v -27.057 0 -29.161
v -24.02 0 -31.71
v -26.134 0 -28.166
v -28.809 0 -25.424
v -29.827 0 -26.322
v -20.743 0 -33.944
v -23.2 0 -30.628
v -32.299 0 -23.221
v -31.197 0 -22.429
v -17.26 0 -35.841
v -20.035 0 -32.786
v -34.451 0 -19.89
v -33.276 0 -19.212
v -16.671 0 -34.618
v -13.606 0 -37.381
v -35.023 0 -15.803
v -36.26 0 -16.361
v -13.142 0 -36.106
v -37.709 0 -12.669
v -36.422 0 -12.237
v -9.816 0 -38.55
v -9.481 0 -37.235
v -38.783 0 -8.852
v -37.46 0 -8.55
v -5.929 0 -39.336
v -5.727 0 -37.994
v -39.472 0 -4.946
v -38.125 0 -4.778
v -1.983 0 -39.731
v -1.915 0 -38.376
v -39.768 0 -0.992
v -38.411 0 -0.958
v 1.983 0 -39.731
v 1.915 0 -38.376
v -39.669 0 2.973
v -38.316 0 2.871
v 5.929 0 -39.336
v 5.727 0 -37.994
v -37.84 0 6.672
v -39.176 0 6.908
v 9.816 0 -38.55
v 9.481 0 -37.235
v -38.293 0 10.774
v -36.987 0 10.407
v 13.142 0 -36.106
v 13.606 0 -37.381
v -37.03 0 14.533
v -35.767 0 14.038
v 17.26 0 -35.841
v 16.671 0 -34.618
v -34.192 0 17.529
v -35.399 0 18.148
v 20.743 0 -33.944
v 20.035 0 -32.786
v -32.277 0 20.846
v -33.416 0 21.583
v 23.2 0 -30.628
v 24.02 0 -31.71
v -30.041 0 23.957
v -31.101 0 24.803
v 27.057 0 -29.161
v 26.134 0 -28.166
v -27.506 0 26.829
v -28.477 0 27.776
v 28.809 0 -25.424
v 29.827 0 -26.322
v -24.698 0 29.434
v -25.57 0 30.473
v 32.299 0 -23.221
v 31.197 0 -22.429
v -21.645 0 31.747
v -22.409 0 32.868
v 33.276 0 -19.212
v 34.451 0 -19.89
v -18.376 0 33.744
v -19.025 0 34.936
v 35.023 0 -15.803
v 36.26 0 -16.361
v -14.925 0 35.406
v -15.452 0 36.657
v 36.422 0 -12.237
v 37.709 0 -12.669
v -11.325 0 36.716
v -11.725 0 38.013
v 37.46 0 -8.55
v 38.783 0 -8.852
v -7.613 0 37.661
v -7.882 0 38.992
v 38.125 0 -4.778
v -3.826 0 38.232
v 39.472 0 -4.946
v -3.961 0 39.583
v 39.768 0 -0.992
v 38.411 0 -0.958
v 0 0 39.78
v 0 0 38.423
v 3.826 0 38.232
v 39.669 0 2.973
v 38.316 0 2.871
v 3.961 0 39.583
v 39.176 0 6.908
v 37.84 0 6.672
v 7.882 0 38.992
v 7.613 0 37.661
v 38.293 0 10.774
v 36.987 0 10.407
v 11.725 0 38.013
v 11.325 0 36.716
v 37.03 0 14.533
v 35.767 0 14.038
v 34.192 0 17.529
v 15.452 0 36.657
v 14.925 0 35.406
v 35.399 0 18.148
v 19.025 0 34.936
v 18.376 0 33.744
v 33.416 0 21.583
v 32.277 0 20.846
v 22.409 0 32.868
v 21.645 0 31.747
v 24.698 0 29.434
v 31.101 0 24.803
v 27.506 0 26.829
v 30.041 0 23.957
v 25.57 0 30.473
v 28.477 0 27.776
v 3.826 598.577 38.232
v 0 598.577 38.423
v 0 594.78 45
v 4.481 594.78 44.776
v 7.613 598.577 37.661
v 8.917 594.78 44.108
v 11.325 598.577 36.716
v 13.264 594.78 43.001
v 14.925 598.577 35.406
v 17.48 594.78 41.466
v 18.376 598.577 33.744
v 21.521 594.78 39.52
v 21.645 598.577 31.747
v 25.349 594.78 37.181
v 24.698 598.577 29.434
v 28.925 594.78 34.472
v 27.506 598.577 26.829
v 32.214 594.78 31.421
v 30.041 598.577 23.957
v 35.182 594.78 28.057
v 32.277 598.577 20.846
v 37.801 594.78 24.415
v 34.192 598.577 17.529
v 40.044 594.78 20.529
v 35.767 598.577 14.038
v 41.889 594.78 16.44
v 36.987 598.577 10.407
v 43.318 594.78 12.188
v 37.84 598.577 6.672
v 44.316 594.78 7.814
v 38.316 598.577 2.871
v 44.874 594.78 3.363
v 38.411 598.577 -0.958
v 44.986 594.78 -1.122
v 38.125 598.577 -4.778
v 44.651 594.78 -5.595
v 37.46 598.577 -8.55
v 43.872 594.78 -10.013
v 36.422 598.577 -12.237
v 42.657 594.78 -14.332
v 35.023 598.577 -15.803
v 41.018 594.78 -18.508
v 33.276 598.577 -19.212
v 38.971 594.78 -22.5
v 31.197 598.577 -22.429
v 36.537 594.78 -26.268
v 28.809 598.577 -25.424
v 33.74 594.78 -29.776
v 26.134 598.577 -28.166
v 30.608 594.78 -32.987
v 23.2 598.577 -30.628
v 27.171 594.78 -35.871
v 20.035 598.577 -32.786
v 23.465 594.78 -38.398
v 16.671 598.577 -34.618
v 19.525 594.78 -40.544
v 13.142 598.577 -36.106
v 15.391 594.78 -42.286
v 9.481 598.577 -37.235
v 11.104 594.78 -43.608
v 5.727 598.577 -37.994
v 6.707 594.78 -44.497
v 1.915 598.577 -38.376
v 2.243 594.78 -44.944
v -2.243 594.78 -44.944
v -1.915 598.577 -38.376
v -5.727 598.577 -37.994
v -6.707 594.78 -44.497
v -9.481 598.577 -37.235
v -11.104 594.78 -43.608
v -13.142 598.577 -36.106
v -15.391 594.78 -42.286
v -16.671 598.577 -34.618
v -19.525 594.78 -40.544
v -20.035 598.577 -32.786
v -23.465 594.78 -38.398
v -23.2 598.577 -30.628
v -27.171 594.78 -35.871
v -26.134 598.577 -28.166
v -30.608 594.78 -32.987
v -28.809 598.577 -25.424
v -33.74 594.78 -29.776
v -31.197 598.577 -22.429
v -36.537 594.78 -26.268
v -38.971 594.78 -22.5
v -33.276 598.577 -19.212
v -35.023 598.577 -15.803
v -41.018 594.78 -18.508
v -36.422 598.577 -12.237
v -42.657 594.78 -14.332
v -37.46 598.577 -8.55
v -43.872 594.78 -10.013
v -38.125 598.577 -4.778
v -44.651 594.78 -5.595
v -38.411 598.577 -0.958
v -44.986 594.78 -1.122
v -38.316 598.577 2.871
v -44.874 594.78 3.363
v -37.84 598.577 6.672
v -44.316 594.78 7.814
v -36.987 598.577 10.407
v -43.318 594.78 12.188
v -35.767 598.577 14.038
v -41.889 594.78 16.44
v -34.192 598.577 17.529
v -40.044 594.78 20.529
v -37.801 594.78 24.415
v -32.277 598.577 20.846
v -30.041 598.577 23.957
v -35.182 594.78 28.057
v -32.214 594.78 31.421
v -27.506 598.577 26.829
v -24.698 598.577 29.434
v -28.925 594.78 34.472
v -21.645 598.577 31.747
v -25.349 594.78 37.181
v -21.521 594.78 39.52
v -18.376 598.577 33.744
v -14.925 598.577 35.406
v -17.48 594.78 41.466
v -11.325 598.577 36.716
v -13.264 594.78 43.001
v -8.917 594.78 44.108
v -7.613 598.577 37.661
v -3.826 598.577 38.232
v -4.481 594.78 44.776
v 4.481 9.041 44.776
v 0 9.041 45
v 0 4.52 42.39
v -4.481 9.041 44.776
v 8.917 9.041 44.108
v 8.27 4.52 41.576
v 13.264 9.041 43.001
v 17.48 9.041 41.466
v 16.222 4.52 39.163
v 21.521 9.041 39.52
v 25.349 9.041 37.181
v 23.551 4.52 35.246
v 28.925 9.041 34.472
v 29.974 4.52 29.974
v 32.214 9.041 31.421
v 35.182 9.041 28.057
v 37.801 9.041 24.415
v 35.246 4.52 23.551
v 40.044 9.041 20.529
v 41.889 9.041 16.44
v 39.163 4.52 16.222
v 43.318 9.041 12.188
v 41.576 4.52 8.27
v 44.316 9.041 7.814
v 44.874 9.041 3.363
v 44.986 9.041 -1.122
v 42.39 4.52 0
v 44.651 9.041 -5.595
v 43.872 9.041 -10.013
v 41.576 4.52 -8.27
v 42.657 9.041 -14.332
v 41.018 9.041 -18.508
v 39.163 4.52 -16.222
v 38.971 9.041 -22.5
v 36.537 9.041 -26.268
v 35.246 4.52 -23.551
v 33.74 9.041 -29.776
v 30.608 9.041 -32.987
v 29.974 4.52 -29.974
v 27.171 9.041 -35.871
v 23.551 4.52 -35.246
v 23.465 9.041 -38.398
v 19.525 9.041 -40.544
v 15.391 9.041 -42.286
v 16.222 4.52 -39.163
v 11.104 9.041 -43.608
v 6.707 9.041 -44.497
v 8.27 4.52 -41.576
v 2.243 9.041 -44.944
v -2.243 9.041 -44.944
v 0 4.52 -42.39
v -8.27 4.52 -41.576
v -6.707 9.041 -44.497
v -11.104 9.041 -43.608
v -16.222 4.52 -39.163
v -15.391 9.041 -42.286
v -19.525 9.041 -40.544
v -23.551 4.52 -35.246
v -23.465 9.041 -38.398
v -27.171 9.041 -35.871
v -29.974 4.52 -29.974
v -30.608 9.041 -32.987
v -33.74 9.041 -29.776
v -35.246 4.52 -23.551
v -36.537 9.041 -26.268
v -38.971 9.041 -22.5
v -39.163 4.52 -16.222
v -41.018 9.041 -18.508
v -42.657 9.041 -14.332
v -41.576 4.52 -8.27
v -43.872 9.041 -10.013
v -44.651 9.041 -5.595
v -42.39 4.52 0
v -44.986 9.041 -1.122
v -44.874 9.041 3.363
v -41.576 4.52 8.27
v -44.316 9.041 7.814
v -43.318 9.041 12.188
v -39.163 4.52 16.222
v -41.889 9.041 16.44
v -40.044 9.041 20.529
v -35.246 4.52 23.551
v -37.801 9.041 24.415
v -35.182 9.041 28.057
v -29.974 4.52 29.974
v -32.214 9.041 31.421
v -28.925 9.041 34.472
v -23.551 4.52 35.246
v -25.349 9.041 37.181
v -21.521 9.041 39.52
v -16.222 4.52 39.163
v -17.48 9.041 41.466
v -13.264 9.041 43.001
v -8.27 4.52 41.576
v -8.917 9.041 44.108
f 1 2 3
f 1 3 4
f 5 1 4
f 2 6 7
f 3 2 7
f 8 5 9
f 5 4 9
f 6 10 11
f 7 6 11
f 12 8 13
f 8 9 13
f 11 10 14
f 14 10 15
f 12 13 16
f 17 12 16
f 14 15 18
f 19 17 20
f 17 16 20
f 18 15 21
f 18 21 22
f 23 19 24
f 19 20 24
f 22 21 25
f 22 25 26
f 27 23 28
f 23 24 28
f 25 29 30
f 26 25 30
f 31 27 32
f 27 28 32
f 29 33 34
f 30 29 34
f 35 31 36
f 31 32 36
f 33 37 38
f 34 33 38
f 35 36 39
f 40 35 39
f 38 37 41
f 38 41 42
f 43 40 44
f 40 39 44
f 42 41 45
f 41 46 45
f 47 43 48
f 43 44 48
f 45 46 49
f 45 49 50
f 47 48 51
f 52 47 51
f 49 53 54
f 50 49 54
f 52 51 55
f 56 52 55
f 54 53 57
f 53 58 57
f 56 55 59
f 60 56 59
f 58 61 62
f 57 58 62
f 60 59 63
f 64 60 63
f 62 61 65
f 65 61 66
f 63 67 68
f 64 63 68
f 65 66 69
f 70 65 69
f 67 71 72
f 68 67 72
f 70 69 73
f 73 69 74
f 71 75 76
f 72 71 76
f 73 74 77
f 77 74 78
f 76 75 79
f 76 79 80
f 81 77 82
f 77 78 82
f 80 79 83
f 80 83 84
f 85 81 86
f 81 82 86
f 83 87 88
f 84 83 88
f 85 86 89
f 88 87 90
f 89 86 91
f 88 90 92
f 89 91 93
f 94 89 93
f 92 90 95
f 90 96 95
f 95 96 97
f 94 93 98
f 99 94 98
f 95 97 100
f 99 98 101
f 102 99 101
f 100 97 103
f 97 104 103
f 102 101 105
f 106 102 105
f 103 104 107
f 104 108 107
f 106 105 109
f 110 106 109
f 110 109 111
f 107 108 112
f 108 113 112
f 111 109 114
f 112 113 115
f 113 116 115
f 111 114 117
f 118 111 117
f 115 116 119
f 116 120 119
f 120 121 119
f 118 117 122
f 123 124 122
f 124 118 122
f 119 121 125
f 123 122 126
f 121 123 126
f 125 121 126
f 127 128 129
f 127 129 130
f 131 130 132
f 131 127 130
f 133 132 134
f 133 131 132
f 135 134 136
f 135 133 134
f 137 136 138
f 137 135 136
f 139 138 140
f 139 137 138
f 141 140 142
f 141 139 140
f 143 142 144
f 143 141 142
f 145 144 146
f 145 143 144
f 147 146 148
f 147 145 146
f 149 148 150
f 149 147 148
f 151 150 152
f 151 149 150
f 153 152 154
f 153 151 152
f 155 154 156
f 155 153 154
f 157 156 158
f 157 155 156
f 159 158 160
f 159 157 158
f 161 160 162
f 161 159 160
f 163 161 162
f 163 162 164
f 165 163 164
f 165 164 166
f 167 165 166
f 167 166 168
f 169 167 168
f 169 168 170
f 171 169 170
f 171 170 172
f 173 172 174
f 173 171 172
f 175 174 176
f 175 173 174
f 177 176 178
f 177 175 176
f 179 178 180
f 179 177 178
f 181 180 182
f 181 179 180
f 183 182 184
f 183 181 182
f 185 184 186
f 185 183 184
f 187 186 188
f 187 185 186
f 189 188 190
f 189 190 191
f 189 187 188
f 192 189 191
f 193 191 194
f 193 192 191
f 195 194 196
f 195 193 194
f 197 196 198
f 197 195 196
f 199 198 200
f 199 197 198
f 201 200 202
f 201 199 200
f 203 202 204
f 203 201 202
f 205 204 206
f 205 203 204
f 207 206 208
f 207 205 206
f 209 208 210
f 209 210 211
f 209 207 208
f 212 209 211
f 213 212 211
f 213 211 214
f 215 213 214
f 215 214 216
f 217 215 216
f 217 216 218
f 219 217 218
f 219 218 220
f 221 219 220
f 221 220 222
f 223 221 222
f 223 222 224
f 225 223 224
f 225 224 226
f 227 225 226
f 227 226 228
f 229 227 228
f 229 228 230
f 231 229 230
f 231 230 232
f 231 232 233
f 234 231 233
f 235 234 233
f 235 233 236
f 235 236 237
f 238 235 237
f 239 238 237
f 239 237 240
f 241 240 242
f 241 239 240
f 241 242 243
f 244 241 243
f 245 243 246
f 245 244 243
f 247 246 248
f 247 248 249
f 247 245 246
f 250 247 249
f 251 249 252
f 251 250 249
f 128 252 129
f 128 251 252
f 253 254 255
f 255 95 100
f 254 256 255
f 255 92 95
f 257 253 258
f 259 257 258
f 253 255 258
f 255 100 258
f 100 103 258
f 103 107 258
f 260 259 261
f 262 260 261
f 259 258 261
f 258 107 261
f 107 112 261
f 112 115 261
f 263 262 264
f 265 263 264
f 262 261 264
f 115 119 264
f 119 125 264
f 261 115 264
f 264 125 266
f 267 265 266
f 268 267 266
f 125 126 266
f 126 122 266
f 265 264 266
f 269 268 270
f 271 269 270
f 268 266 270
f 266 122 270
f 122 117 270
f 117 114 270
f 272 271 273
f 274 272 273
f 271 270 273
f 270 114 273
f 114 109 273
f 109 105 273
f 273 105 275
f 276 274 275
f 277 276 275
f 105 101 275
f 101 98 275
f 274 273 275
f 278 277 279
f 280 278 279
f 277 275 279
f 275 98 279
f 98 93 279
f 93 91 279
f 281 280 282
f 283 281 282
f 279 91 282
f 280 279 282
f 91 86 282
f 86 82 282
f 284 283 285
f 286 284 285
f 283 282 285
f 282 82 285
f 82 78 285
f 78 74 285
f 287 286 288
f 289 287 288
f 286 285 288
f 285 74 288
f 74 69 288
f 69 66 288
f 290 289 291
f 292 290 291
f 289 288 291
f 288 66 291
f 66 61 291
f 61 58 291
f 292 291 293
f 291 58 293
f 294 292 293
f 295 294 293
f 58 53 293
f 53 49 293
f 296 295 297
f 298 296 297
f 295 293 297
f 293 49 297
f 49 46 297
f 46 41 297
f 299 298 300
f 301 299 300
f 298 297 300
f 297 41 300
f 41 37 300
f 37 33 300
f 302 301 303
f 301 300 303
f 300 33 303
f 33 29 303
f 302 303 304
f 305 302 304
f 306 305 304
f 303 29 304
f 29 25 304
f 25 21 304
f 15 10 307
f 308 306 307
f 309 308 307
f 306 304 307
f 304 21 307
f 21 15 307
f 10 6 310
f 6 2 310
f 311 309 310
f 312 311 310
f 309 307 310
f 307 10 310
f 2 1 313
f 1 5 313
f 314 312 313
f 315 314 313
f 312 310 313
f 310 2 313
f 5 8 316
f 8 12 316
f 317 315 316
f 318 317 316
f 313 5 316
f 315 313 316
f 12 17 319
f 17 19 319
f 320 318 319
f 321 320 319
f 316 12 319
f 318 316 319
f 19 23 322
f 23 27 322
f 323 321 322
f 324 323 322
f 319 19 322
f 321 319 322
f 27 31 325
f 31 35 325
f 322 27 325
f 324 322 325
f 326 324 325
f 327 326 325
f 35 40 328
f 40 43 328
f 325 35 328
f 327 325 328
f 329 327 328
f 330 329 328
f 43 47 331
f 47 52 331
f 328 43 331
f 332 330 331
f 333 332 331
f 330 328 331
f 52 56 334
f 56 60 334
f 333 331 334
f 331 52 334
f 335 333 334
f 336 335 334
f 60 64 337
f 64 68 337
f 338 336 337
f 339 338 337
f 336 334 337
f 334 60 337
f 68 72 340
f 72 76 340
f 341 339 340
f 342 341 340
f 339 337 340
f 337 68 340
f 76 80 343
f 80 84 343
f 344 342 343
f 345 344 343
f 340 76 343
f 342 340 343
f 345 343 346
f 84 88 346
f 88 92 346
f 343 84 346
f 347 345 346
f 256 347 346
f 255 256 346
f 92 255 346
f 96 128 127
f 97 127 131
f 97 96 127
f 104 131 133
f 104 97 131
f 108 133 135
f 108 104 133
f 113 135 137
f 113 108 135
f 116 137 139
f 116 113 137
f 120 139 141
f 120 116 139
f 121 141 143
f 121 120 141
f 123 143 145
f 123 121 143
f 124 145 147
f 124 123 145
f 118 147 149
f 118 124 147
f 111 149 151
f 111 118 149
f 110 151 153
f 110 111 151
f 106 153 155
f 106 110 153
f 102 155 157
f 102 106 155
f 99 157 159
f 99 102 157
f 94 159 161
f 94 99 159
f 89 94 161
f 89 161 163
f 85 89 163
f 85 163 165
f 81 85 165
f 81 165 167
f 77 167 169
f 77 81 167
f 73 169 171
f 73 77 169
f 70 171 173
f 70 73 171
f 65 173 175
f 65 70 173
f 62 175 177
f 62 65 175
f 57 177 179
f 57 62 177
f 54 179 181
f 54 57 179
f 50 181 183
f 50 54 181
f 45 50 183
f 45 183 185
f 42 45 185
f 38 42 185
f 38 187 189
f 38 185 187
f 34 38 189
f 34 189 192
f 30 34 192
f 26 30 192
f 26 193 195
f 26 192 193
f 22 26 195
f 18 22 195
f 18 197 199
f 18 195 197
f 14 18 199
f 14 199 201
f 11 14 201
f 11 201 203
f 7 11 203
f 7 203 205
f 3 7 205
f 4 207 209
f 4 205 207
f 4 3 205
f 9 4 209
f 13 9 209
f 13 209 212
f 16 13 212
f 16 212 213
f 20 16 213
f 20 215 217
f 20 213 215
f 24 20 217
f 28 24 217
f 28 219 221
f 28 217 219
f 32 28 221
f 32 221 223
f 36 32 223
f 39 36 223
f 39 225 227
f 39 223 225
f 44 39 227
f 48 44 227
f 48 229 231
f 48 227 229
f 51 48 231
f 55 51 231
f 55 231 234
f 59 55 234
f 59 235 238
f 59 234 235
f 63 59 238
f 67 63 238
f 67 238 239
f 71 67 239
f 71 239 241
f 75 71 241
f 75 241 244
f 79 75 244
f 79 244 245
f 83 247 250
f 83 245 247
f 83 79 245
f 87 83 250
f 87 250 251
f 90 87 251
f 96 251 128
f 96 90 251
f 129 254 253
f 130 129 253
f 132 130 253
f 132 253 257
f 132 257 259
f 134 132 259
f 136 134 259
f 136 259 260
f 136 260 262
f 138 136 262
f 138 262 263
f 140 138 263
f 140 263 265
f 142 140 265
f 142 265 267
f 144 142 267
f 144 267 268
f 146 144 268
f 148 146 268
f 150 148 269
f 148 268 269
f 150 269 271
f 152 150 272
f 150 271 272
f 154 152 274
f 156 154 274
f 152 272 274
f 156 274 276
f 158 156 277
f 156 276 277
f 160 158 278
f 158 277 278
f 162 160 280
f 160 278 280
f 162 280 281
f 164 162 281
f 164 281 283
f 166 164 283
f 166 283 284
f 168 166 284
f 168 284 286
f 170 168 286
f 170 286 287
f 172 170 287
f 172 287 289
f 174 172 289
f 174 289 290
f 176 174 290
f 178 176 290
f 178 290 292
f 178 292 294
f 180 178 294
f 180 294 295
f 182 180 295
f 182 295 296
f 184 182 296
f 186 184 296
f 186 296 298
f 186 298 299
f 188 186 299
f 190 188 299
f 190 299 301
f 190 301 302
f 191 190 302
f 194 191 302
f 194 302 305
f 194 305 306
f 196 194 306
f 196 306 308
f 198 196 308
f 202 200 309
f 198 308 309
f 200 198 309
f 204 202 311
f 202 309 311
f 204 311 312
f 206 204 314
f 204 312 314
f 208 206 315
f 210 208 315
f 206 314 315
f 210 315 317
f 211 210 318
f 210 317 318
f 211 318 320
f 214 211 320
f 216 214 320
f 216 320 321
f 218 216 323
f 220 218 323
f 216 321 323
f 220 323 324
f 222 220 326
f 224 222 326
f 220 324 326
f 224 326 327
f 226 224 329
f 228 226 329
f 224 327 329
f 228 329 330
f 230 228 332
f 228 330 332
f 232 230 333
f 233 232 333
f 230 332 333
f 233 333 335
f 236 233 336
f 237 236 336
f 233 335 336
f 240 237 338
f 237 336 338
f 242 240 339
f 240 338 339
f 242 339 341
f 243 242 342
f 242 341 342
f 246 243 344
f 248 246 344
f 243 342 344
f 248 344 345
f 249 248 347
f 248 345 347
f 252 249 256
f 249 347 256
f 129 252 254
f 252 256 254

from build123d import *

# Parameters (mm, degrees)
SKETCH1_R           = 45
BOSS_EXTRUDE1_DEPTH = 600
SKETCH2_R           = 38.423285368
CUT_EXTRUDE1_DEPTH  = 604.365560834
CHAMFER1_SIZE       = 5.219704
CHAMFER1_SIZE_2     = 9.040792


with BuildPart() as part:
    # Sketch1 → Boss-Extrude1 (new body)
    with BuildSketch(Plane(origin=(0, 0, 0), x_dir=(1, 0, 0), z_dir=(0, 1, 0))):
        with Locations(Location((0, 0, 0), (0, 0, 270))):
            Circle(SKETCH1_R)
    extrude(amount=BOSS_EXTRUDE1_DEPTH)

    # Sketch2 → Cut-Extrude1 (cut, through all)
    with BuildSketch(Plane(origin=(0, 0, 0), x_dir=(1, 0, 0), z_dir=(0, 1, 0))):
        with Locations(Location((0, 0, 0), (0, 0, 270))):
            Circle(SKETCH2_R)
    extrude(amount=CUT_EXTRUDE1_DEPTH, mode=Mode.SUBTRACT)

    # Chamfer1
    # the kernel refuses this chamfer: 9.040792, 5.219704 mm, written as the material it takes off along each edge
    with BuildSketch(Plane(origin=(0, 600, 0), x_dir=(0, 0, 1), z_dir=(-1, 0, 0))) as chamfer1_piece_1:
        Polygon((45, -CHAMFER1_SIZE), (45 - CHAMFER1_SIZE_2, 0), (45, 0), align=None)
    revolve(axis=Axis((0, 600, 0), (0, 1, 0)), mode=Mode.SUBTRACT)
    with BuildSketch(Plane(origin=(0, 0, 0), x_dir=(0, 0, 1), z_dir=(-1, 0, 0))) as chamfer1_piece_2:
        Polygon((45, CHAMFER1_SIZE_2), (45 - CHAMFER1_SIZE, 0), (45, 0), align=None)
    revolve(axis=Axis((0, 0, 0), (0, 1, 0)), mode=Mode.SUBTRACT)


solid = part.part
